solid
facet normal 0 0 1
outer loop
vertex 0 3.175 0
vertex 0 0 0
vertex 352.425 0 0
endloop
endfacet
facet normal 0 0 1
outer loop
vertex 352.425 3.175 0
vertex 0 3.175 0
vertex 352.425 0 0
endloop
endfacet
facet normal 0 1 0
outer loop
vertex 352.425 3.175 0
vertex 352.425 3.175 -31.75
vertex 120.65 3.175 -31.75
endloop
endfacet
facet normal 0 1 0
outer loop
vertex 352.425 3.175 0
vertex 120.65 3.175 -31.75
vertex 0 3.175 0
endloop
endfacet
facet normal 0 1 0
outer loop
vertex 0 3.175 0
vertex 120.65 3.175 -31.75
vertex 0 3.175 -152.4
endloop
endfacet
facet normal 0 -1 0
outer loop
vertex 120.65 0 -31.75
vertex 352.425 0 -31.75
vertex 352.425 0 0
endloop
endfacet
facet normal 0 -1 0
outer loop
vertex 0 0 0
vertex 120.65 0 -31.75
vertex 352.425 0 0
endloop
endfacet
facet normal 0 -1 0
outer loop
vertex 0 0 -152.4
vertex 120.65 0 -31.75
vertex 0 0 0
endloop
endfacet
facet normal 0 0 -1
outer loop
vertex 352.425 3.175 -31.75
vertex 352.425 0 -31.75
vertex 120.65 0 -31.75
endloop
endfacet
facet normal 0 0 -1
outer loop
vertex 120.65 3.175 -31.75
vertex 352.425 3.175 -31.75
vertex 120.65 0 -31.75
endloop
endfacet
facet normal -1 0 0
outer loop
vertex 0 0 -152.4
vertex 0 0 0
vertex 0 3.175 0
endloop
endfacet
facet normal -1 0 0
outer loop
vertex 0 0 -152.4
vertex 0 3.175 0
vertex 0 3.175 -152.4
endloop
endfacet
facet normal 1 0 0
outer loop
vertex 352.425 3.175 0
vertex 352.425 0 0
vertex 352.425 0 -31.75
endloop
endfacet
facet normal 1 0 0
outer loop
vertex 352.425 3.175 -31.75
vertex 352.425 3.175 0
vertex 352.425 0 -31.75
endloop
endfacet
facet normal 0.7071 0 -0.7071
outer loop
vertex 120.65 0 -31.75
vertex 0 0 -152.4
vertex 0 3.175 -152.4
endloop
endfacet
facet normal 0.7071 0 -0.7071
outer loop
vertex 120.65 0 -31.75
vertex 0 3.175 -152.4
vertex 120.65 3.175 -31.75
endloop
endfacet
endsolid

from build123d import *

# Parameters (mm, degrees)
BOSS_EXTRUDE1_DEPTH = 3.175


with BuildPart() as part:
    # Sketch1 → Boss-Extrude1 (new body)
    with BuildSketch(Plane(origin=(0, 0, 0), x_dir=(1, 0, 0), z_dir=(0, 1, 0))):
        Polygon((152.4, 0), (0, 0), (0, 152.4), align=None)
        Polygon((120.65, 31.75), (152.4, 0), (352.425, 0), (352.425, 31.75), align=None)
    extrude(amount=BOSS_EXTRUDE1_DEPTH)


solid = part.part
